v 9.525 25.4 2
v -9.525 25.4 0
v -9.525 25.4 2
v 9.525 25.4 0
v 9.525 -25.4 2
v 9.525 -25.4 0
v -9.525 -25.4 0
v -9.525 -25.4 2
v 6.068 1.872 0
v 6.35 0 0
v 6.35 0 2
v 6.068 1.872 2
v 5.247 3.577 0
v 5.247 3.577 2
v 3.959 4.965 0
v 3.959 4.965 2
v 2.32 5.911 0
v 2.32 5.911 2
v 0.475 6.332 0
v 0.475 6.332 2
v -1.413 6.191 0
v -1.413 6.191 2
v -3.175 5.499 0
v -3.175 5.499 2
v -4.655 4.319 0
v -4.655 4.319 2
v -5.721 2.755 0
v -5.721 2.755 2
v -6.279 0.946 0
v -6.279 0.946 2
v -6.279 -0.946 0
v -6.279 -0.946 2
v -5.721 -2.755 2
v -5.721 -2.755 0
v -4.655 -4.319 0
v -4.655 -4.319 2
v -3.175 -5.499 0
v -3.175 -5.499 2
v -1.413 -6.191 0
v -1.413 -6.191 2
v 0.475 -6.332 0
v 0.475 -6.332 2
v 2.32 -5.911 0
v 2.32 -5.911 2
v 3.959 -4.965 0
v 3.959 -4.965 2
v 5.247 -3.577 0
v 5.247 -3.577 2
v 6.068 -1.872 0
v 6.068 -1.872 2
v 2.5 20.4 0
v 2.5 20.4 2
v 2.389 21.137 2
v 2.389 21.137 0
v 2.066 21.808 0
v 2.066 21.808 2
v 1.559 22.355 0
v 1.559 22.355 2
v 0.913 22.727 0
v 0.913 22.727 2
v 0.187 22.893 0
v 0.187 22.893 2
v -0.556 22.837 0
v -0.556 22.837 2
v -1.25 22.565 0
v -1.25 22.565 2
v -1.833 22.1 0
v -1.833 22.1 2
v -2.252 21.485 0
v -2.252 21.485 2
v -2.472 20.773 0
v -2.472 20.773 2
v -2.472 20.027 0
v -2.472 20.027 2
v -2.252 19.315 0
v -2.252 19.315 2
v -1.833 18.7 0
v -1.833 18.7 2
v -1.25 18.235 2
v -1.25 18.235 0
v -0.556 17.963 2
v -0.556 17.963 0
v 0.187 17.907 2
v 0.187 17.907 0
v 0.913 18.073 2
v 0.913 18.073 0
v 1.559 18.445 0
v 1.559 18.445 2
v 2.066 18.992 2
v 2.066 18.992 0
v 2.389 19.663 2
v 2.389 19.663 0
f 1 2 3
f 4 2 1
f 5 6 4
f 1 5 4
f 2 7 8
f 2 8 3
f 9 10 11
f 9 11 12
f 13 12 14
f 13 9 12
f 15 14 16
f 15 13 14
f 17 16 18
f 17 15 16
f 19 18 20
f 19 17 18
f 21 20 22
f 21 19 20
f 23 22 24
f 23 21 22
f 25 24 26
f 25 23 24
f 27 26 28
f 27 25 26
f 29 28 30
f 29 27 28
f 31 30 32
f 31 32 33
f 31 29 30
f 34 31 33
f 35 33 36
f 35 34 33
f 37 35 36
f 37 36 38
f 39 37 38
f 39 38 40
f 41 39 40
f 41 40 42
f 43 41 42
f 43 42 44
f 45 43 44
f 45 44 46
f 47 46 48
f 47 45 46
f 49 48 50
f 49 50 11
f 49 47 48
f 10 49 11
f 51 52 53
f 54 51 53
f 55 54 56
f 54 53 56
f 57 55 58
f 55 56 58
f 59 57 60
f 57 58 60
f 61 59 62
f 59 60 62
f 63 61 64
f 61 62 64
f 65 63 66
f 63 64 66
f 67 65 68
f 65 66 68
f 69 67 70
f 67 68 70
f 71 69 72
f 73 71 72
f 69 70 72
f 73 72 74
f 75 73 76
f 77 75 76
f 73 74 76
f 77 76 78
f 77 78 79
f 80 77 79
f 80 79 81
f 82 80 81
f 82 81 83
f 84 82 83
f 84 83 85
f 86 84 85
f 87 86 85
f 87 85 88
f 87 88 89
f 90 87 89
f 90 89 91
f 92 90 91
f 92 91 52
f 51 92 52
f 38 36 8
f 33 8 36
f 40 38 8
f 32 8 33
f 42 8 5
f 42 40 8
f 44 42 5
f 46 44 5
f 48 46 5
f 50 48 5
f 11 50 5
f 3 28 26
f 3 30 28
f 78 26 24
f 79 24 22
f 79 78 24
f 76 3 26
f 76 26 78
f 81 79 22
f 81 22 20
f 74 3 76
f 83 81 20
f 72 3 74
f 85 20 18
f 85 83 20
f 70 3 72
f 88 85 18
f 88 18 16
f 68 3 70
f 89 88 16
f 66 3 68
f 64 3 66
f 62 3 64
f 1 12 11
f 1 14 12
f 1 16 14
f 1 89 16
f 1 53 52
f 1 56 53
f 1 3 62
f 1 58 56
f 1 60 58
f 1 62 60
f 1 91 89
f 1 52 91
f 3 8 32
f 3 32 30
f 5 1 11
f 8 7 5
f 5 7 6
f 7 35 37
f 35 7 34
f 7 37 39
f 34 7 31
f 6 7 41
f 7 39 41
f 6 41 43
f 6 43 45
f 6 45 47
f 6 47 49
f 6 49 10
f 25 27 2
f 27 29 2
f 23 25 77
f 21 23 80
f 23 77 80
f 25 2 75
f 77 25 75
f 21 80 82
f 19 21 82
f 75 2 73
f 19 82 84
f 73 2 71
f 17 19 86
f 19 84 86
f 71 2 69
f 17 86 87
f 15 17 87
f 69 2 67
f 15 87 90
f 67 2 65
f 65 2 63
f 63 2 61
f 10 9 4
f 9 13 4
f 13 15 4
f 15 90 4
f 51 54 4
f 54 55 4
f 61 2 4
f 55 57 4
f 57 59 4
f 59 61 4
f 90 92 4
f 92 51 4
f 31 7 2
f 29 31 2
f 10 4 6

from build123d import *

# Parameters (mm, degrees)
SKETCH1_W                    = 19.05
SKETCH1_H                    = 50.8
SKETCH1_R                    = 6.35
BOSS_EXTRUDE1_DEPTH          = 2
F_5_0_5_DIAMETER_HOLE1_D     = 5
F_5_0_5_DIAMETER_HOLE1_DEPTH = 5
F_5_0_5_DIAMETER_HOLE1_TIP   = 1.502151548


with BuildPart() as part:
    # Sketch1 → Boss-Extrude1 (new body)
    with BuildSketch(Plane.XY):
        Rectangle(SKETCH1_W, SKETCH1_H)
        Circle(SKETCH1_R, mode=Mode.SUBTRACT)
    extrude(amount=BOSS_EXTRUDE1_DEPTH)

    # Ø5.0 (5) Diameter Hole1
    with Locations(Plane(origin=(0, 0, 0), x_dir=(-1, 0, 0), z_dir=(0, 0, -1))):
        with Locations((0, 20.4)):
            Hole(F_5_0_5_DIAMETER_HOLE1_D / 2, depth=F_5_0_5_DIAMETER_HOLE1_DEPTH)
            with Locations((0, 0, -(F_5_0_5_DIAMETER_HOLE1_DEPTH + F_5_0_5_DIAMETER_HOLE1_TIP / 2))):  # 118° drill point
                Cone(0, F_5_0_5_DIAMETER_HOLE1_D / 2, F_5_0_5_DIAMETER_HOLE1_TIP, mode=Mode.SUBTRACT)


solid = part.part
